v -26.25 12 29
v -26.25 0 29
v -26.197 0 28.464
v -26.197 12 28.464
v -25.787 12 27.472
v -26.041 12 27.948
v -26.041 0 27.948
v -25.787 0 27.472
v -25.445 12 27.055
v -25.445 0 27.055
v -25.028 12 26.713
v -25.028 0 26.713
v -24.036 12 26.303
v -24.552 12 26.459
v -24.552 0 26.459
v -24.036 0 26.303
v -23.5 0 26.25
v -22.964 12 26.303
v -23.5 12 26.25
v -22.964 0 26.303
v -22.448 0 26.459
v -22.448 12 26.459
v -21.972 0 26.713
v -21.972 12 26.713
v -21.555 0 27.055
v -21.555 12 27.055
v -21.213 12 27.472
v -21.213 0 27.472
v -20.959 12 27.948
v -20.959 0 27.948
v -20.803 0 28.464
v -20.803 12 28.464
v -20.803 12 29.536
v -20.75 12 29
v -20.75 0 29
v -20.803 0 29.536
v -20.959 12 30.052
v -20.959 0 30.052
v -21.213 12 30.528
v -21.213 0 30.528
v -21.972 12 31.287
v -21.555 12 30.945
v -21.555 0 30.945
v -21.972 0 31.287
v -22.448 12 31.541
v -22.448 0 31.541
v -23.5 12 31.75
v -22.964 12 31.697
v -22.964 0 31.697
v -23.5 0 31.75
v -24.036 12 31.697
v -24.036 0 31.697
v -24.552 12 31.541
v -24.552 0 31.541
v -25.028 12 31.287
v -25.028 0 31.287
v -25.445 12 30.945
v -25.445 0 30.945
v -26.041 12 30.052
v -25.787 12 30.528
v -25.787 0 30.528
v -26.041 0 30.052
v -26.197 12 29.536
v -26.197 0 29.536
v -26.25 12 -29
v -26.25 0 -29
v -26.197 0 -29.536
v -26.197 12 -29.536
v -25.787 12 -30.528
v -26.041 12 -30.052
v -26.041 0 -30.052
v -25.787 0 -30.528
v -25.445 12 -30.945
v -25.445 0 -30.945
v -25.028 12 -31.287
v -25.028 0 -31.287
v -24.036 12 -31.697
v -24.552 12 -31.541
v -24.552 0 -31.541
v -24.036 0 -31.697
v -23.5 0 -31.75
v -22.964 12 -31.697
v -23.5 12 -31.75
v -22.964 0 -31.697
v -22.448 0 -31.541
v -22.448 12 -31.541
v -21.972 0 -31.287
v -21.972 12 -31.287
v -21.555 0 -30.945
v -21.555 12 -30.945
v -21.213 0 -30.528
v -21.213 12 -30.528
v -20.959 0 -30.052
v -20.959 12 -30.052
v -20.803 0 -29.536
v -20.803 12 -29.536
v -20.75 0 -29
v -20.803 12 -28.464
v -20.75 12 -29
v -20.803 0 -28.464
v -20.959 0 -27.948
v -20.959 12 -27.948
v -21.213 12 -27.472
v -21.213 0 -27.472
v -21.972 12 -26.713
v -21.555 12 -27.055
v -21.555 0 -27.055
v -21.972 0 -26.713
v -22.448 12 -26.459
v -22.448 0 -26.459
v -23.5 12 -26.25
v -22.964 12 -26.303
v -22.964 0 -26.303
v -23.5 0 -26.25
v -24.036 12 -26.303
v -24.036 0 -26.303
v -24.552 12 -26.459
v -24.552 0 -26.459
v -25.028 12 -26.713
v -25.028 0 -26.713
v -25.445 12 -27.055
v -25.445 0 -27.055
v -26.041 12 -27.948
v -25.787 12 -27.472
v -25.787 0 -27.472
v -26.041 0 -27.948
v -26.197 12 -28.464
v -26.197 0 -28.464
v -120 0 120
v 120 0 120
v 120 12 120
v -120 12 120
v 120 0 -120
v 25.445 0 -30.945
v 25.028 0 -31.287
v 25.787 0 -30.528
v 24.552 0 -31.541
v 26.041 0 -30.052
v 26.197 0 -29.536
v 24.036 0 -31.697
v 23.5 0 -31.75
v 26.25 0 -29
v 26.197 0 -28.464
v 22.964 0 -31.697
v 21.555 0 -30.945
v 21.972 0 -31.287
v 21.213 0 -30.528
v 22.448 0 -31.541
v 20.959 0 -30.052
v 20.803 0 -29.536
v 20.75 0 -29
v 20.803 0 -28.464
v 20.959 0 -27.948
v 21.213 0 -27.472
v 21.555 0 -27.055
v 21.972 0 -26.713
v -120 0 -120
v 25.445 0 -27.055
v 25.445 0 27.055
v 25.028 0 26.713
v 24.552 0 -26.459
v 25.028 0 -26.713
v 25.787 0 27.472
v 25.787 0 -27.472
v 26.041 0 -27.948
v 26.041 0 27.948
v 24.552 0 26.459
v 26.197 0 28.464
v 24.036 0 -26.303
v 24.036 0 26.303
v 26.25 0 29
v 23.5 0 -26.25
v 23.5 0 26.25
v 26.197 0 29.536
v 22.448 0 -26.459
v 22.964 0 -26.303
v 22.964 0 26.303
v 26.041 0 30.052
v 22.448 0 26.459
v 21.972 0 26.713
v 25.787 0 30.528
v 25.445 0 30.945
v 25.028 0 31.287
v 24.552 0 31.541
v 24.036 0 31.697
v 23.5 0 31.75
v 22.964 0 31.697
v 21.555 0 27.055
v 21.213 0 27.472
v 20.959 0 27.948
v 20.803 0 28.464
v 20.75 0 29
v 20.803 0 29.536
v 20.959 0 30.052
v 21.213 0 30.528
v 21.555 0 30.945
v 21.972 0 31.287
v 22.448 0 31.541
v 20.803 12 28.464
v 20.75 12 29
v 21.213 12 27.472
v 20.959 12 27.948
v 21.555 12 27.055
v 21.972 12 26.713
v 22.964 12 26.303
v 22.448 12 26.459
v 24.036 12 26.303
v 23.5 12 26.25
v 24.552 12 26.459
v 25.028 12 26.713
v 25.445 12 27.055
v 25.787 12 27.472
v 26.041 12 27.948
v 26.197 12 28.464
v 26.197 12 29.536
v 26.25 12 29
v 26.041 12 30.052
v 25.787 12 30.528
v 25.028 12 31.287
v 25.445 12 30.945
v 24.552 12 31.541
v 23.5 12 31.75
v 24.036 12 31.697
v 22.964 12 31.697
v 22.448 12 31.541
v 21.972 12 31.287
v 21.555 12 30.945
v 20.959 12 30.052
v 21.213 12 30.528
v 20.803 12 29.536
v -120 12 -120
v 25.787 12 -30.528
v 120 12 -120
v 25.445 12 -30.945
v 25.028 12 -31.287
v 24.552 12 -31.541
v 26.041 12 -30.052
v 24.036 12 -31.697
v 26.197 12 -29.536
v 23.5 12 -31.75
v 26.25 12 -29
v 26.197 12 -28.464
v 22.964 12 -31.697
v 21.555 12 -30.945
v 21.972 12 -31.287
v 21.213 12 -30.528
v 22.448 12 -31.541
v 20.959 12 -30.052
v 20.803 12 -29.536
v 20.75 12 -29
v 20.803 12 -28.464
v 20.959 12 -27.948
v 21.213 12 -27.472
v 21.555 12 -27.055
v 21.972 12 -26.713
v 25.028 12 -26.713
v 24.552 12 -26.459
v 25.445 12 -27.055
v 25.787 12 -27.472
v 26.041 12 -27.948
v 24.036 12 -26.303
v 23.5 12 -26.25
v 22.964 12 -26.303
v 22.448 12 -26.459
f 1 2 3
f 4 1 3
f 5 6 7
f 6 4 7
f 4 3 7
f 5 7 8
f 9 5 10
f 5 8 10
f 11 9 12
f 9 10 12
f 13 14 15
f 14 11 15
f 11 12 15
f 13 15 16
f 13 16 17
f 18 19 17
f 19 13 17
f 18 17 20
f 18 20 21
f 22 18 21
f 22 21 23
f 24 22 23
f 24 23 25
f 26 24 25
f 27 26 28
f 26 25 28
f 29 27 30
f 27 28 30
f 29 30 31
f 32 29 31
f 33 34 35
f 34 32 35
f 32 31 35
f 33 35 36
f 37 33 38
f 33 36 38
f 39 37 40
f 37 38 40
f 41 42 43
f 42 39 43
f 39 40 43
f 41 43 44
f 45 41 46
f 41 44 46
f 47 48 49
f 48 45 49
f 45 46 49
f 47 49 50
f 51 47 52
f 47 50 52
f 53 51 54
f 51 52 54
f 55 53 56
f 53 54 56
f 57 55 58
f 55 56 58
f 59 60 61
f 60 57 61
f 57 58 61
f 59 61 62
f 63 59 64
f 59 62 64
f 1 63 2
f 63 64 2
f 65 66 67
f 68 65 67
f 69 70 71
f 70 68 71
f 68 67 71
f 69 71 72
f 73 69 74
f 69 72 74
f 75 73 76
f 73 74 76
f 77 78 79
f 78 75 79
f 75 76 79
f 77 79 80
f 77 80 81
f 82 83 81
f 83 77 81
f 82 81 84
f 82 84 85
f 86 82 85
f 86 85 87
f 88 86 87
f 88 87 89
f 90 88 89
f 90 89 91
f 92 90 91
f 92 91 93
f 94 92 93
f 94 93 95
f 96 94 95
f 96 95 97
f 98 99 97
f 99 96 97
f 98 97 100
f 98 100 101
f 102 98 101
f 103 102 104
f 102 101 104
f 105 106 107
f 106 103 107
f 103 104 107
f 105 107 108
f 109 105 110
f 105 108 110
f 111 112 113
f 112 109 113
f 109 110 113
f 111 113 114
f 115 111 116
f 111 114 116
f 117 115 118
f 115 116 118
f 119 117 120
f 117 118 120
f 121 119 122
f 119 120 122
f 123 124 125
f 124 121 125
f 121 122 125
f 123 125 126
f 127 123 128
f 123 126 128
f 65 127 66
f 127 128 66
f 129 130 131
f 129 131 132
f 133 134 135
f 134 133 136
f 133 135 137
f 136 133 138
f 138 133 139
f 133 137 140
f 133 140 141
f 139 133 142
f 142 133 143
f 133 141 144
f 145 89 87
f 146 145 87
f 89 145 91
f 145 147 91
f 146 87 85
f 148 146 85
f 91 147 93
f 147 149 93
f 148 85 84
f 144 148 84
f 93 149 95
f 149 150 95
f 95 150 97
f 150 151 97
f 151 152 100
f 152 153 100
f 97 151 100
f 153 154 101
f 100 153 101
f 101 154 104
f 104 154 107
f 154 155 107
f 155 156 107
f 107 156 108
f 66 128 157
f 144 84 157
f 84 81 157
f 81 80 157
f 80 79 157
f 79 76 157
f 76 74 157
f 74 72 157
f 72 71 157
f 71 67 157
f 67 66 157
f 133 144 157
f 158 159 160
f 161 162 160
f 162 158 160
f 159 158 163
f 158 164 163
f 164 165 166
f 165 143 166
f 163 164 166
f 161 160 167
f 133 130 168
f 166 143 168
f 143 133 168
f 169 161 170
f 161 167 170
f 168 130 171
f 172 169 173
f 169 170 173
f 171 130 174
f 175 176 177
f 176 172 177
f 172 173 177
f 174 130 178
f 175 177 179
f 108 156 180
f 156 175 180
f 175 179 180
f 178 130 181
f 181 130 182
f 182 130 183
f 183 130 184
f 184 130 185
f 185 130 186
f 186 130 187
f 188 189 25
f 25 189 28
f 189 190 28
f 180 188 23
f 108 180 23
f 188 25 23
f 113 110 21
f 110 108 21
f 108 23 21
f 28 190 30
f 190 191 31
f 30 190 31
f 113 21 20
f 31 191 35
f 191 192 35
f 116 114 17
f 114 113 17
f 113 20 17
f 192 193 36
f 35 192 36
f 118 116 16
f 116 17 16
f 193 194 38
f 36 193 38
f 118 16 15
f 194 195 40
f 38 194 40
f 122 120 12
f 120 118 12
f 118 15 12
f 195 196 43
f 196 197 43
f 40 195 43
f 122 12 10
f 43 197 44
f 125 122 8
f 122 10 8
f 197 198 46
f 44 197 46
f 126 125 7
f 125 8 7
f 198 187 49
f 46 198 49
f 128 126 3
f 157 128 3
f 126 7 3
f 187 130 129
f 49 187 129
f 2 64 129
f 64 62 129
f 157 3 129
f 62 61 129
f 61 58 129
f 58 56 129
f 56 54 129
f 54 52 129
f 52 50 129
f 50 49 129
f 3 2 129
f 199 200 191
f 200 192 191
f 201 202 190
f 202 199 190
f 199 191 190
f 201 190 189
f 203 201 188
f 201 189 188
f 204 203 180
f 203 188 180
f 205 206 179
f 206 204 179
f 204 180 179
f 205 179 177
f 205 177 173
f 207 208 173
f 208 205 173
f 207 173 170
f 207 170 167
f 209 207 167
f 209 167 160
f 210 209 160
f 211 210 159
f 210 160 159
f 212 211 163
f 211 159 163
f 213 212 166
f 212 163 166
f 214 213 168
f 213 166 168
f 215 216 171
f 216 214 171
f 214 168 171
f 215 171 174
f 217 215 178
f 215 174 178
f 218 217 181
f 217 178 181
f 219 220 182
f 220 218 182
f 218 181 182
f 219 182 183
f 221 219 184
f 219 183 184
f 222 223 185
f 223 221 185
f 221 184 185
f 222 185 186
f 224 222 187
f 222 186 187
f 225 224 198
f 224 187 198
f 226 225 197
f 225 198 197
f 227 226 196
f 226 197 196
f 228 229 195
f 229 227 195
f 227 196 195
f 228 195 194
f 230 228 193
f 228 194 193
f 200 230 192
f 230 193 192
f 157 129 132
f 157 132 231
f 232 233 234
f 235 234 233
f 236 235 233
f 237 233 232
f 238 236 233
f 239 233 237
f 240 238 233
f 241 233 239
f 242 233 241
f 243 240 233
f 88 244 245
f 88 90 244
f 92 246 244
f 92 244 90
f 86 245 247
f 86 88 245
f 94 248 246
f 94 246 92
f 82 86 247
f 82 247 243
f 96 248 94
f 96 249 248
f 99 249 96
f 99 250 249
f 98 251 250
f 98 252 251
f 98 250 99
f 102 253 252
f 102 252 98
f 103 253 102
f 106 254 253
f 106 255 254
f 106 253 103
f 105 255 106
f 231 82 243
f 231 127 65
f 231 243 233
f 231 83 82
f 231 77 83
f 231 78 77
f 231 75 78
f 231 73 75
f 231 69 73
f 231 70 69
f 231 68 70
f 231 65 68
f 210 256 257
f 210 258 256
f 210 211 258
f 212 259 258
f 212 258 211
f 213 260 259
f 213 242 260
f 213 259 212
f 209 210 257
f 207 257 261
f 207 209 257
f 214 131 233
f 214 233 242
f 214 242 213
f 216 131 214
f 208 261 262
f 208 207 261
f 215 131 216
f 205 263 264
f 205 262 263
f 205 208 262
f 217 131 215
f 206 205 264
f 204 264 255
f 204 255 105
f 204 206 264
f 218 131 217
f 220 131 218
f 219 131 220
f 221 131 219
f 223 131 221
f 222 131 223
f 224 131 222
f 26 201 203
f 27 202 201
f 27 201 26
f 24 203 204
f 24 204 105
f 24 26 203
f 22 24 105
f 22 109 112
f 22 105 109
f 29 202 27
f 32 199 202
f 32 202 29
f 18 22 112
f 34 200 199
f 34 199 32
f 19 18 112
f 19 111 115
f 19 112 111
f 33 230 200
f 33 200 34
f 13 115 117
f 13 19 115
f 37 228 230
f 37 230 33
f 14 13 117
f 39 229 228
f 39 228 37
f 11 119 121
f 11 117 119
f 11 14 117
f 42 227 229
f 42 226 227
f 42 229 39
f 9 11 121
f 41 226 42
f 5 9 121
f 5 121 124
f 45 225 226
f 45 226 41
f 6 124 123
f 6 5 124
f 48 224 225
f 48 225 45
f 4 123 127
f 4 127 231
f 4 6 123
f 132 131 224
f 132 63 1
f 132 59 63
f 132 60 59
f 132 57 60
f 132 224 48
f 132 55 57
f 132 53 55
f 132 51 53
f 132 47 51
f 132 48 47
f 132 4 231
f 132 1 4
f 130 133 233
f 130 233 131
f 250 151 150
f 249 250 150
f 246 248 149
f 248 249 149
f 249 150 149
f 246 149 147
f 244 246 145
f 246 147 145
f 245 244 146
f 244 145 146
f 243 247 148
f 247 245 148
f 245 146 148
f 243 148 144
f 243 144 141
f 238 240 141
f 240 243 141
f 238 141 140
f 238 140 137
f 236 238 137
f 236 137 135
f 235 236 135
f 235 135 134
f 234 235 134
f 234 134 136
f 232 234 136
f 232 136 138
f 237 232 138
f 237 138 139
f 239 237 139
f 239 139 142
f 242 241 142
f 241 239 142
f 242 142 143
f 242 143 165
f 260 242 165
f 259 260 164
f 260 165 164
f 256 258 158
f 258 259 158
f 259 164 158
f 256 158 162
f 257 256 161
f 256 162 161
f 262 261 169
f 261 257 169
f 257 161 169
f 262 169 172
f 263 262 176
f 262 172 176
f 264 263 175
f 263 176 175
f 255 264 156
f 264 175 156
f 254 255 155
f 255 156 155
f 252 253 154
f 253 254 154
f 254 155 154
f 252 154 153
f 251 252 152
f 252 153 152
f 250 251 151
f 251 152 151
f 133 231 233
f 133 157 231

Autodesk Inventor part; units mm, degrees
ref_plane "YZ Plane" through (0, 0, 0) normal (1, 0, 0) x (0, 1, 0)
ref_plane "XZ Plane" through (0, 0, 0) normal (0, 1, 0) x (-1, 0, 0)
ref_plane "XY Plane" through (0, 0, 0) normal (0, 0, 1) x (1, 0, 0)
sketch "Sketch1" plane through (0, 0, 0) normal (0, 1, 0) x (-1, 0, 0)
  line L0 (-120, 120) -> (120, 120)
  line L1 (120, 120) -> (120, -120)
  line L2 (120, -120) -> (-120, -120)
  line L3 (-120, -120) -> (-120, 120)
  line L4 (-120, 120) -> (120, -120) construction
  line L5 (120, 120) -> (-120, -120) construction
  circle A0 centre (23.5, 29) radius 2.75
  circle A1 centre (23.5, -29) radius 2.75
  circle A2 centre (-23.5, 29) radius 2.75
  circle A3 centre (-23.5, -29) radius 2.75
  point P0 (0, 0)
  dimension "d0" = 240
  dimension "d1" = 240
  dimension "d4" = 5.5
  dimension "d7" = 58
  dimension "d10" = 47
  dimension "d13" = 29
  dimension "d14" = 29
  dimension "d15" = 23.5
  dimension "d16" = 23.5
extrude "Extrusion1" add sketch "Sketch1" along normal blind 12
equation "\"d13\" = d14"
equation "\"d15\" = d16"
properties part number "MDFTop"
